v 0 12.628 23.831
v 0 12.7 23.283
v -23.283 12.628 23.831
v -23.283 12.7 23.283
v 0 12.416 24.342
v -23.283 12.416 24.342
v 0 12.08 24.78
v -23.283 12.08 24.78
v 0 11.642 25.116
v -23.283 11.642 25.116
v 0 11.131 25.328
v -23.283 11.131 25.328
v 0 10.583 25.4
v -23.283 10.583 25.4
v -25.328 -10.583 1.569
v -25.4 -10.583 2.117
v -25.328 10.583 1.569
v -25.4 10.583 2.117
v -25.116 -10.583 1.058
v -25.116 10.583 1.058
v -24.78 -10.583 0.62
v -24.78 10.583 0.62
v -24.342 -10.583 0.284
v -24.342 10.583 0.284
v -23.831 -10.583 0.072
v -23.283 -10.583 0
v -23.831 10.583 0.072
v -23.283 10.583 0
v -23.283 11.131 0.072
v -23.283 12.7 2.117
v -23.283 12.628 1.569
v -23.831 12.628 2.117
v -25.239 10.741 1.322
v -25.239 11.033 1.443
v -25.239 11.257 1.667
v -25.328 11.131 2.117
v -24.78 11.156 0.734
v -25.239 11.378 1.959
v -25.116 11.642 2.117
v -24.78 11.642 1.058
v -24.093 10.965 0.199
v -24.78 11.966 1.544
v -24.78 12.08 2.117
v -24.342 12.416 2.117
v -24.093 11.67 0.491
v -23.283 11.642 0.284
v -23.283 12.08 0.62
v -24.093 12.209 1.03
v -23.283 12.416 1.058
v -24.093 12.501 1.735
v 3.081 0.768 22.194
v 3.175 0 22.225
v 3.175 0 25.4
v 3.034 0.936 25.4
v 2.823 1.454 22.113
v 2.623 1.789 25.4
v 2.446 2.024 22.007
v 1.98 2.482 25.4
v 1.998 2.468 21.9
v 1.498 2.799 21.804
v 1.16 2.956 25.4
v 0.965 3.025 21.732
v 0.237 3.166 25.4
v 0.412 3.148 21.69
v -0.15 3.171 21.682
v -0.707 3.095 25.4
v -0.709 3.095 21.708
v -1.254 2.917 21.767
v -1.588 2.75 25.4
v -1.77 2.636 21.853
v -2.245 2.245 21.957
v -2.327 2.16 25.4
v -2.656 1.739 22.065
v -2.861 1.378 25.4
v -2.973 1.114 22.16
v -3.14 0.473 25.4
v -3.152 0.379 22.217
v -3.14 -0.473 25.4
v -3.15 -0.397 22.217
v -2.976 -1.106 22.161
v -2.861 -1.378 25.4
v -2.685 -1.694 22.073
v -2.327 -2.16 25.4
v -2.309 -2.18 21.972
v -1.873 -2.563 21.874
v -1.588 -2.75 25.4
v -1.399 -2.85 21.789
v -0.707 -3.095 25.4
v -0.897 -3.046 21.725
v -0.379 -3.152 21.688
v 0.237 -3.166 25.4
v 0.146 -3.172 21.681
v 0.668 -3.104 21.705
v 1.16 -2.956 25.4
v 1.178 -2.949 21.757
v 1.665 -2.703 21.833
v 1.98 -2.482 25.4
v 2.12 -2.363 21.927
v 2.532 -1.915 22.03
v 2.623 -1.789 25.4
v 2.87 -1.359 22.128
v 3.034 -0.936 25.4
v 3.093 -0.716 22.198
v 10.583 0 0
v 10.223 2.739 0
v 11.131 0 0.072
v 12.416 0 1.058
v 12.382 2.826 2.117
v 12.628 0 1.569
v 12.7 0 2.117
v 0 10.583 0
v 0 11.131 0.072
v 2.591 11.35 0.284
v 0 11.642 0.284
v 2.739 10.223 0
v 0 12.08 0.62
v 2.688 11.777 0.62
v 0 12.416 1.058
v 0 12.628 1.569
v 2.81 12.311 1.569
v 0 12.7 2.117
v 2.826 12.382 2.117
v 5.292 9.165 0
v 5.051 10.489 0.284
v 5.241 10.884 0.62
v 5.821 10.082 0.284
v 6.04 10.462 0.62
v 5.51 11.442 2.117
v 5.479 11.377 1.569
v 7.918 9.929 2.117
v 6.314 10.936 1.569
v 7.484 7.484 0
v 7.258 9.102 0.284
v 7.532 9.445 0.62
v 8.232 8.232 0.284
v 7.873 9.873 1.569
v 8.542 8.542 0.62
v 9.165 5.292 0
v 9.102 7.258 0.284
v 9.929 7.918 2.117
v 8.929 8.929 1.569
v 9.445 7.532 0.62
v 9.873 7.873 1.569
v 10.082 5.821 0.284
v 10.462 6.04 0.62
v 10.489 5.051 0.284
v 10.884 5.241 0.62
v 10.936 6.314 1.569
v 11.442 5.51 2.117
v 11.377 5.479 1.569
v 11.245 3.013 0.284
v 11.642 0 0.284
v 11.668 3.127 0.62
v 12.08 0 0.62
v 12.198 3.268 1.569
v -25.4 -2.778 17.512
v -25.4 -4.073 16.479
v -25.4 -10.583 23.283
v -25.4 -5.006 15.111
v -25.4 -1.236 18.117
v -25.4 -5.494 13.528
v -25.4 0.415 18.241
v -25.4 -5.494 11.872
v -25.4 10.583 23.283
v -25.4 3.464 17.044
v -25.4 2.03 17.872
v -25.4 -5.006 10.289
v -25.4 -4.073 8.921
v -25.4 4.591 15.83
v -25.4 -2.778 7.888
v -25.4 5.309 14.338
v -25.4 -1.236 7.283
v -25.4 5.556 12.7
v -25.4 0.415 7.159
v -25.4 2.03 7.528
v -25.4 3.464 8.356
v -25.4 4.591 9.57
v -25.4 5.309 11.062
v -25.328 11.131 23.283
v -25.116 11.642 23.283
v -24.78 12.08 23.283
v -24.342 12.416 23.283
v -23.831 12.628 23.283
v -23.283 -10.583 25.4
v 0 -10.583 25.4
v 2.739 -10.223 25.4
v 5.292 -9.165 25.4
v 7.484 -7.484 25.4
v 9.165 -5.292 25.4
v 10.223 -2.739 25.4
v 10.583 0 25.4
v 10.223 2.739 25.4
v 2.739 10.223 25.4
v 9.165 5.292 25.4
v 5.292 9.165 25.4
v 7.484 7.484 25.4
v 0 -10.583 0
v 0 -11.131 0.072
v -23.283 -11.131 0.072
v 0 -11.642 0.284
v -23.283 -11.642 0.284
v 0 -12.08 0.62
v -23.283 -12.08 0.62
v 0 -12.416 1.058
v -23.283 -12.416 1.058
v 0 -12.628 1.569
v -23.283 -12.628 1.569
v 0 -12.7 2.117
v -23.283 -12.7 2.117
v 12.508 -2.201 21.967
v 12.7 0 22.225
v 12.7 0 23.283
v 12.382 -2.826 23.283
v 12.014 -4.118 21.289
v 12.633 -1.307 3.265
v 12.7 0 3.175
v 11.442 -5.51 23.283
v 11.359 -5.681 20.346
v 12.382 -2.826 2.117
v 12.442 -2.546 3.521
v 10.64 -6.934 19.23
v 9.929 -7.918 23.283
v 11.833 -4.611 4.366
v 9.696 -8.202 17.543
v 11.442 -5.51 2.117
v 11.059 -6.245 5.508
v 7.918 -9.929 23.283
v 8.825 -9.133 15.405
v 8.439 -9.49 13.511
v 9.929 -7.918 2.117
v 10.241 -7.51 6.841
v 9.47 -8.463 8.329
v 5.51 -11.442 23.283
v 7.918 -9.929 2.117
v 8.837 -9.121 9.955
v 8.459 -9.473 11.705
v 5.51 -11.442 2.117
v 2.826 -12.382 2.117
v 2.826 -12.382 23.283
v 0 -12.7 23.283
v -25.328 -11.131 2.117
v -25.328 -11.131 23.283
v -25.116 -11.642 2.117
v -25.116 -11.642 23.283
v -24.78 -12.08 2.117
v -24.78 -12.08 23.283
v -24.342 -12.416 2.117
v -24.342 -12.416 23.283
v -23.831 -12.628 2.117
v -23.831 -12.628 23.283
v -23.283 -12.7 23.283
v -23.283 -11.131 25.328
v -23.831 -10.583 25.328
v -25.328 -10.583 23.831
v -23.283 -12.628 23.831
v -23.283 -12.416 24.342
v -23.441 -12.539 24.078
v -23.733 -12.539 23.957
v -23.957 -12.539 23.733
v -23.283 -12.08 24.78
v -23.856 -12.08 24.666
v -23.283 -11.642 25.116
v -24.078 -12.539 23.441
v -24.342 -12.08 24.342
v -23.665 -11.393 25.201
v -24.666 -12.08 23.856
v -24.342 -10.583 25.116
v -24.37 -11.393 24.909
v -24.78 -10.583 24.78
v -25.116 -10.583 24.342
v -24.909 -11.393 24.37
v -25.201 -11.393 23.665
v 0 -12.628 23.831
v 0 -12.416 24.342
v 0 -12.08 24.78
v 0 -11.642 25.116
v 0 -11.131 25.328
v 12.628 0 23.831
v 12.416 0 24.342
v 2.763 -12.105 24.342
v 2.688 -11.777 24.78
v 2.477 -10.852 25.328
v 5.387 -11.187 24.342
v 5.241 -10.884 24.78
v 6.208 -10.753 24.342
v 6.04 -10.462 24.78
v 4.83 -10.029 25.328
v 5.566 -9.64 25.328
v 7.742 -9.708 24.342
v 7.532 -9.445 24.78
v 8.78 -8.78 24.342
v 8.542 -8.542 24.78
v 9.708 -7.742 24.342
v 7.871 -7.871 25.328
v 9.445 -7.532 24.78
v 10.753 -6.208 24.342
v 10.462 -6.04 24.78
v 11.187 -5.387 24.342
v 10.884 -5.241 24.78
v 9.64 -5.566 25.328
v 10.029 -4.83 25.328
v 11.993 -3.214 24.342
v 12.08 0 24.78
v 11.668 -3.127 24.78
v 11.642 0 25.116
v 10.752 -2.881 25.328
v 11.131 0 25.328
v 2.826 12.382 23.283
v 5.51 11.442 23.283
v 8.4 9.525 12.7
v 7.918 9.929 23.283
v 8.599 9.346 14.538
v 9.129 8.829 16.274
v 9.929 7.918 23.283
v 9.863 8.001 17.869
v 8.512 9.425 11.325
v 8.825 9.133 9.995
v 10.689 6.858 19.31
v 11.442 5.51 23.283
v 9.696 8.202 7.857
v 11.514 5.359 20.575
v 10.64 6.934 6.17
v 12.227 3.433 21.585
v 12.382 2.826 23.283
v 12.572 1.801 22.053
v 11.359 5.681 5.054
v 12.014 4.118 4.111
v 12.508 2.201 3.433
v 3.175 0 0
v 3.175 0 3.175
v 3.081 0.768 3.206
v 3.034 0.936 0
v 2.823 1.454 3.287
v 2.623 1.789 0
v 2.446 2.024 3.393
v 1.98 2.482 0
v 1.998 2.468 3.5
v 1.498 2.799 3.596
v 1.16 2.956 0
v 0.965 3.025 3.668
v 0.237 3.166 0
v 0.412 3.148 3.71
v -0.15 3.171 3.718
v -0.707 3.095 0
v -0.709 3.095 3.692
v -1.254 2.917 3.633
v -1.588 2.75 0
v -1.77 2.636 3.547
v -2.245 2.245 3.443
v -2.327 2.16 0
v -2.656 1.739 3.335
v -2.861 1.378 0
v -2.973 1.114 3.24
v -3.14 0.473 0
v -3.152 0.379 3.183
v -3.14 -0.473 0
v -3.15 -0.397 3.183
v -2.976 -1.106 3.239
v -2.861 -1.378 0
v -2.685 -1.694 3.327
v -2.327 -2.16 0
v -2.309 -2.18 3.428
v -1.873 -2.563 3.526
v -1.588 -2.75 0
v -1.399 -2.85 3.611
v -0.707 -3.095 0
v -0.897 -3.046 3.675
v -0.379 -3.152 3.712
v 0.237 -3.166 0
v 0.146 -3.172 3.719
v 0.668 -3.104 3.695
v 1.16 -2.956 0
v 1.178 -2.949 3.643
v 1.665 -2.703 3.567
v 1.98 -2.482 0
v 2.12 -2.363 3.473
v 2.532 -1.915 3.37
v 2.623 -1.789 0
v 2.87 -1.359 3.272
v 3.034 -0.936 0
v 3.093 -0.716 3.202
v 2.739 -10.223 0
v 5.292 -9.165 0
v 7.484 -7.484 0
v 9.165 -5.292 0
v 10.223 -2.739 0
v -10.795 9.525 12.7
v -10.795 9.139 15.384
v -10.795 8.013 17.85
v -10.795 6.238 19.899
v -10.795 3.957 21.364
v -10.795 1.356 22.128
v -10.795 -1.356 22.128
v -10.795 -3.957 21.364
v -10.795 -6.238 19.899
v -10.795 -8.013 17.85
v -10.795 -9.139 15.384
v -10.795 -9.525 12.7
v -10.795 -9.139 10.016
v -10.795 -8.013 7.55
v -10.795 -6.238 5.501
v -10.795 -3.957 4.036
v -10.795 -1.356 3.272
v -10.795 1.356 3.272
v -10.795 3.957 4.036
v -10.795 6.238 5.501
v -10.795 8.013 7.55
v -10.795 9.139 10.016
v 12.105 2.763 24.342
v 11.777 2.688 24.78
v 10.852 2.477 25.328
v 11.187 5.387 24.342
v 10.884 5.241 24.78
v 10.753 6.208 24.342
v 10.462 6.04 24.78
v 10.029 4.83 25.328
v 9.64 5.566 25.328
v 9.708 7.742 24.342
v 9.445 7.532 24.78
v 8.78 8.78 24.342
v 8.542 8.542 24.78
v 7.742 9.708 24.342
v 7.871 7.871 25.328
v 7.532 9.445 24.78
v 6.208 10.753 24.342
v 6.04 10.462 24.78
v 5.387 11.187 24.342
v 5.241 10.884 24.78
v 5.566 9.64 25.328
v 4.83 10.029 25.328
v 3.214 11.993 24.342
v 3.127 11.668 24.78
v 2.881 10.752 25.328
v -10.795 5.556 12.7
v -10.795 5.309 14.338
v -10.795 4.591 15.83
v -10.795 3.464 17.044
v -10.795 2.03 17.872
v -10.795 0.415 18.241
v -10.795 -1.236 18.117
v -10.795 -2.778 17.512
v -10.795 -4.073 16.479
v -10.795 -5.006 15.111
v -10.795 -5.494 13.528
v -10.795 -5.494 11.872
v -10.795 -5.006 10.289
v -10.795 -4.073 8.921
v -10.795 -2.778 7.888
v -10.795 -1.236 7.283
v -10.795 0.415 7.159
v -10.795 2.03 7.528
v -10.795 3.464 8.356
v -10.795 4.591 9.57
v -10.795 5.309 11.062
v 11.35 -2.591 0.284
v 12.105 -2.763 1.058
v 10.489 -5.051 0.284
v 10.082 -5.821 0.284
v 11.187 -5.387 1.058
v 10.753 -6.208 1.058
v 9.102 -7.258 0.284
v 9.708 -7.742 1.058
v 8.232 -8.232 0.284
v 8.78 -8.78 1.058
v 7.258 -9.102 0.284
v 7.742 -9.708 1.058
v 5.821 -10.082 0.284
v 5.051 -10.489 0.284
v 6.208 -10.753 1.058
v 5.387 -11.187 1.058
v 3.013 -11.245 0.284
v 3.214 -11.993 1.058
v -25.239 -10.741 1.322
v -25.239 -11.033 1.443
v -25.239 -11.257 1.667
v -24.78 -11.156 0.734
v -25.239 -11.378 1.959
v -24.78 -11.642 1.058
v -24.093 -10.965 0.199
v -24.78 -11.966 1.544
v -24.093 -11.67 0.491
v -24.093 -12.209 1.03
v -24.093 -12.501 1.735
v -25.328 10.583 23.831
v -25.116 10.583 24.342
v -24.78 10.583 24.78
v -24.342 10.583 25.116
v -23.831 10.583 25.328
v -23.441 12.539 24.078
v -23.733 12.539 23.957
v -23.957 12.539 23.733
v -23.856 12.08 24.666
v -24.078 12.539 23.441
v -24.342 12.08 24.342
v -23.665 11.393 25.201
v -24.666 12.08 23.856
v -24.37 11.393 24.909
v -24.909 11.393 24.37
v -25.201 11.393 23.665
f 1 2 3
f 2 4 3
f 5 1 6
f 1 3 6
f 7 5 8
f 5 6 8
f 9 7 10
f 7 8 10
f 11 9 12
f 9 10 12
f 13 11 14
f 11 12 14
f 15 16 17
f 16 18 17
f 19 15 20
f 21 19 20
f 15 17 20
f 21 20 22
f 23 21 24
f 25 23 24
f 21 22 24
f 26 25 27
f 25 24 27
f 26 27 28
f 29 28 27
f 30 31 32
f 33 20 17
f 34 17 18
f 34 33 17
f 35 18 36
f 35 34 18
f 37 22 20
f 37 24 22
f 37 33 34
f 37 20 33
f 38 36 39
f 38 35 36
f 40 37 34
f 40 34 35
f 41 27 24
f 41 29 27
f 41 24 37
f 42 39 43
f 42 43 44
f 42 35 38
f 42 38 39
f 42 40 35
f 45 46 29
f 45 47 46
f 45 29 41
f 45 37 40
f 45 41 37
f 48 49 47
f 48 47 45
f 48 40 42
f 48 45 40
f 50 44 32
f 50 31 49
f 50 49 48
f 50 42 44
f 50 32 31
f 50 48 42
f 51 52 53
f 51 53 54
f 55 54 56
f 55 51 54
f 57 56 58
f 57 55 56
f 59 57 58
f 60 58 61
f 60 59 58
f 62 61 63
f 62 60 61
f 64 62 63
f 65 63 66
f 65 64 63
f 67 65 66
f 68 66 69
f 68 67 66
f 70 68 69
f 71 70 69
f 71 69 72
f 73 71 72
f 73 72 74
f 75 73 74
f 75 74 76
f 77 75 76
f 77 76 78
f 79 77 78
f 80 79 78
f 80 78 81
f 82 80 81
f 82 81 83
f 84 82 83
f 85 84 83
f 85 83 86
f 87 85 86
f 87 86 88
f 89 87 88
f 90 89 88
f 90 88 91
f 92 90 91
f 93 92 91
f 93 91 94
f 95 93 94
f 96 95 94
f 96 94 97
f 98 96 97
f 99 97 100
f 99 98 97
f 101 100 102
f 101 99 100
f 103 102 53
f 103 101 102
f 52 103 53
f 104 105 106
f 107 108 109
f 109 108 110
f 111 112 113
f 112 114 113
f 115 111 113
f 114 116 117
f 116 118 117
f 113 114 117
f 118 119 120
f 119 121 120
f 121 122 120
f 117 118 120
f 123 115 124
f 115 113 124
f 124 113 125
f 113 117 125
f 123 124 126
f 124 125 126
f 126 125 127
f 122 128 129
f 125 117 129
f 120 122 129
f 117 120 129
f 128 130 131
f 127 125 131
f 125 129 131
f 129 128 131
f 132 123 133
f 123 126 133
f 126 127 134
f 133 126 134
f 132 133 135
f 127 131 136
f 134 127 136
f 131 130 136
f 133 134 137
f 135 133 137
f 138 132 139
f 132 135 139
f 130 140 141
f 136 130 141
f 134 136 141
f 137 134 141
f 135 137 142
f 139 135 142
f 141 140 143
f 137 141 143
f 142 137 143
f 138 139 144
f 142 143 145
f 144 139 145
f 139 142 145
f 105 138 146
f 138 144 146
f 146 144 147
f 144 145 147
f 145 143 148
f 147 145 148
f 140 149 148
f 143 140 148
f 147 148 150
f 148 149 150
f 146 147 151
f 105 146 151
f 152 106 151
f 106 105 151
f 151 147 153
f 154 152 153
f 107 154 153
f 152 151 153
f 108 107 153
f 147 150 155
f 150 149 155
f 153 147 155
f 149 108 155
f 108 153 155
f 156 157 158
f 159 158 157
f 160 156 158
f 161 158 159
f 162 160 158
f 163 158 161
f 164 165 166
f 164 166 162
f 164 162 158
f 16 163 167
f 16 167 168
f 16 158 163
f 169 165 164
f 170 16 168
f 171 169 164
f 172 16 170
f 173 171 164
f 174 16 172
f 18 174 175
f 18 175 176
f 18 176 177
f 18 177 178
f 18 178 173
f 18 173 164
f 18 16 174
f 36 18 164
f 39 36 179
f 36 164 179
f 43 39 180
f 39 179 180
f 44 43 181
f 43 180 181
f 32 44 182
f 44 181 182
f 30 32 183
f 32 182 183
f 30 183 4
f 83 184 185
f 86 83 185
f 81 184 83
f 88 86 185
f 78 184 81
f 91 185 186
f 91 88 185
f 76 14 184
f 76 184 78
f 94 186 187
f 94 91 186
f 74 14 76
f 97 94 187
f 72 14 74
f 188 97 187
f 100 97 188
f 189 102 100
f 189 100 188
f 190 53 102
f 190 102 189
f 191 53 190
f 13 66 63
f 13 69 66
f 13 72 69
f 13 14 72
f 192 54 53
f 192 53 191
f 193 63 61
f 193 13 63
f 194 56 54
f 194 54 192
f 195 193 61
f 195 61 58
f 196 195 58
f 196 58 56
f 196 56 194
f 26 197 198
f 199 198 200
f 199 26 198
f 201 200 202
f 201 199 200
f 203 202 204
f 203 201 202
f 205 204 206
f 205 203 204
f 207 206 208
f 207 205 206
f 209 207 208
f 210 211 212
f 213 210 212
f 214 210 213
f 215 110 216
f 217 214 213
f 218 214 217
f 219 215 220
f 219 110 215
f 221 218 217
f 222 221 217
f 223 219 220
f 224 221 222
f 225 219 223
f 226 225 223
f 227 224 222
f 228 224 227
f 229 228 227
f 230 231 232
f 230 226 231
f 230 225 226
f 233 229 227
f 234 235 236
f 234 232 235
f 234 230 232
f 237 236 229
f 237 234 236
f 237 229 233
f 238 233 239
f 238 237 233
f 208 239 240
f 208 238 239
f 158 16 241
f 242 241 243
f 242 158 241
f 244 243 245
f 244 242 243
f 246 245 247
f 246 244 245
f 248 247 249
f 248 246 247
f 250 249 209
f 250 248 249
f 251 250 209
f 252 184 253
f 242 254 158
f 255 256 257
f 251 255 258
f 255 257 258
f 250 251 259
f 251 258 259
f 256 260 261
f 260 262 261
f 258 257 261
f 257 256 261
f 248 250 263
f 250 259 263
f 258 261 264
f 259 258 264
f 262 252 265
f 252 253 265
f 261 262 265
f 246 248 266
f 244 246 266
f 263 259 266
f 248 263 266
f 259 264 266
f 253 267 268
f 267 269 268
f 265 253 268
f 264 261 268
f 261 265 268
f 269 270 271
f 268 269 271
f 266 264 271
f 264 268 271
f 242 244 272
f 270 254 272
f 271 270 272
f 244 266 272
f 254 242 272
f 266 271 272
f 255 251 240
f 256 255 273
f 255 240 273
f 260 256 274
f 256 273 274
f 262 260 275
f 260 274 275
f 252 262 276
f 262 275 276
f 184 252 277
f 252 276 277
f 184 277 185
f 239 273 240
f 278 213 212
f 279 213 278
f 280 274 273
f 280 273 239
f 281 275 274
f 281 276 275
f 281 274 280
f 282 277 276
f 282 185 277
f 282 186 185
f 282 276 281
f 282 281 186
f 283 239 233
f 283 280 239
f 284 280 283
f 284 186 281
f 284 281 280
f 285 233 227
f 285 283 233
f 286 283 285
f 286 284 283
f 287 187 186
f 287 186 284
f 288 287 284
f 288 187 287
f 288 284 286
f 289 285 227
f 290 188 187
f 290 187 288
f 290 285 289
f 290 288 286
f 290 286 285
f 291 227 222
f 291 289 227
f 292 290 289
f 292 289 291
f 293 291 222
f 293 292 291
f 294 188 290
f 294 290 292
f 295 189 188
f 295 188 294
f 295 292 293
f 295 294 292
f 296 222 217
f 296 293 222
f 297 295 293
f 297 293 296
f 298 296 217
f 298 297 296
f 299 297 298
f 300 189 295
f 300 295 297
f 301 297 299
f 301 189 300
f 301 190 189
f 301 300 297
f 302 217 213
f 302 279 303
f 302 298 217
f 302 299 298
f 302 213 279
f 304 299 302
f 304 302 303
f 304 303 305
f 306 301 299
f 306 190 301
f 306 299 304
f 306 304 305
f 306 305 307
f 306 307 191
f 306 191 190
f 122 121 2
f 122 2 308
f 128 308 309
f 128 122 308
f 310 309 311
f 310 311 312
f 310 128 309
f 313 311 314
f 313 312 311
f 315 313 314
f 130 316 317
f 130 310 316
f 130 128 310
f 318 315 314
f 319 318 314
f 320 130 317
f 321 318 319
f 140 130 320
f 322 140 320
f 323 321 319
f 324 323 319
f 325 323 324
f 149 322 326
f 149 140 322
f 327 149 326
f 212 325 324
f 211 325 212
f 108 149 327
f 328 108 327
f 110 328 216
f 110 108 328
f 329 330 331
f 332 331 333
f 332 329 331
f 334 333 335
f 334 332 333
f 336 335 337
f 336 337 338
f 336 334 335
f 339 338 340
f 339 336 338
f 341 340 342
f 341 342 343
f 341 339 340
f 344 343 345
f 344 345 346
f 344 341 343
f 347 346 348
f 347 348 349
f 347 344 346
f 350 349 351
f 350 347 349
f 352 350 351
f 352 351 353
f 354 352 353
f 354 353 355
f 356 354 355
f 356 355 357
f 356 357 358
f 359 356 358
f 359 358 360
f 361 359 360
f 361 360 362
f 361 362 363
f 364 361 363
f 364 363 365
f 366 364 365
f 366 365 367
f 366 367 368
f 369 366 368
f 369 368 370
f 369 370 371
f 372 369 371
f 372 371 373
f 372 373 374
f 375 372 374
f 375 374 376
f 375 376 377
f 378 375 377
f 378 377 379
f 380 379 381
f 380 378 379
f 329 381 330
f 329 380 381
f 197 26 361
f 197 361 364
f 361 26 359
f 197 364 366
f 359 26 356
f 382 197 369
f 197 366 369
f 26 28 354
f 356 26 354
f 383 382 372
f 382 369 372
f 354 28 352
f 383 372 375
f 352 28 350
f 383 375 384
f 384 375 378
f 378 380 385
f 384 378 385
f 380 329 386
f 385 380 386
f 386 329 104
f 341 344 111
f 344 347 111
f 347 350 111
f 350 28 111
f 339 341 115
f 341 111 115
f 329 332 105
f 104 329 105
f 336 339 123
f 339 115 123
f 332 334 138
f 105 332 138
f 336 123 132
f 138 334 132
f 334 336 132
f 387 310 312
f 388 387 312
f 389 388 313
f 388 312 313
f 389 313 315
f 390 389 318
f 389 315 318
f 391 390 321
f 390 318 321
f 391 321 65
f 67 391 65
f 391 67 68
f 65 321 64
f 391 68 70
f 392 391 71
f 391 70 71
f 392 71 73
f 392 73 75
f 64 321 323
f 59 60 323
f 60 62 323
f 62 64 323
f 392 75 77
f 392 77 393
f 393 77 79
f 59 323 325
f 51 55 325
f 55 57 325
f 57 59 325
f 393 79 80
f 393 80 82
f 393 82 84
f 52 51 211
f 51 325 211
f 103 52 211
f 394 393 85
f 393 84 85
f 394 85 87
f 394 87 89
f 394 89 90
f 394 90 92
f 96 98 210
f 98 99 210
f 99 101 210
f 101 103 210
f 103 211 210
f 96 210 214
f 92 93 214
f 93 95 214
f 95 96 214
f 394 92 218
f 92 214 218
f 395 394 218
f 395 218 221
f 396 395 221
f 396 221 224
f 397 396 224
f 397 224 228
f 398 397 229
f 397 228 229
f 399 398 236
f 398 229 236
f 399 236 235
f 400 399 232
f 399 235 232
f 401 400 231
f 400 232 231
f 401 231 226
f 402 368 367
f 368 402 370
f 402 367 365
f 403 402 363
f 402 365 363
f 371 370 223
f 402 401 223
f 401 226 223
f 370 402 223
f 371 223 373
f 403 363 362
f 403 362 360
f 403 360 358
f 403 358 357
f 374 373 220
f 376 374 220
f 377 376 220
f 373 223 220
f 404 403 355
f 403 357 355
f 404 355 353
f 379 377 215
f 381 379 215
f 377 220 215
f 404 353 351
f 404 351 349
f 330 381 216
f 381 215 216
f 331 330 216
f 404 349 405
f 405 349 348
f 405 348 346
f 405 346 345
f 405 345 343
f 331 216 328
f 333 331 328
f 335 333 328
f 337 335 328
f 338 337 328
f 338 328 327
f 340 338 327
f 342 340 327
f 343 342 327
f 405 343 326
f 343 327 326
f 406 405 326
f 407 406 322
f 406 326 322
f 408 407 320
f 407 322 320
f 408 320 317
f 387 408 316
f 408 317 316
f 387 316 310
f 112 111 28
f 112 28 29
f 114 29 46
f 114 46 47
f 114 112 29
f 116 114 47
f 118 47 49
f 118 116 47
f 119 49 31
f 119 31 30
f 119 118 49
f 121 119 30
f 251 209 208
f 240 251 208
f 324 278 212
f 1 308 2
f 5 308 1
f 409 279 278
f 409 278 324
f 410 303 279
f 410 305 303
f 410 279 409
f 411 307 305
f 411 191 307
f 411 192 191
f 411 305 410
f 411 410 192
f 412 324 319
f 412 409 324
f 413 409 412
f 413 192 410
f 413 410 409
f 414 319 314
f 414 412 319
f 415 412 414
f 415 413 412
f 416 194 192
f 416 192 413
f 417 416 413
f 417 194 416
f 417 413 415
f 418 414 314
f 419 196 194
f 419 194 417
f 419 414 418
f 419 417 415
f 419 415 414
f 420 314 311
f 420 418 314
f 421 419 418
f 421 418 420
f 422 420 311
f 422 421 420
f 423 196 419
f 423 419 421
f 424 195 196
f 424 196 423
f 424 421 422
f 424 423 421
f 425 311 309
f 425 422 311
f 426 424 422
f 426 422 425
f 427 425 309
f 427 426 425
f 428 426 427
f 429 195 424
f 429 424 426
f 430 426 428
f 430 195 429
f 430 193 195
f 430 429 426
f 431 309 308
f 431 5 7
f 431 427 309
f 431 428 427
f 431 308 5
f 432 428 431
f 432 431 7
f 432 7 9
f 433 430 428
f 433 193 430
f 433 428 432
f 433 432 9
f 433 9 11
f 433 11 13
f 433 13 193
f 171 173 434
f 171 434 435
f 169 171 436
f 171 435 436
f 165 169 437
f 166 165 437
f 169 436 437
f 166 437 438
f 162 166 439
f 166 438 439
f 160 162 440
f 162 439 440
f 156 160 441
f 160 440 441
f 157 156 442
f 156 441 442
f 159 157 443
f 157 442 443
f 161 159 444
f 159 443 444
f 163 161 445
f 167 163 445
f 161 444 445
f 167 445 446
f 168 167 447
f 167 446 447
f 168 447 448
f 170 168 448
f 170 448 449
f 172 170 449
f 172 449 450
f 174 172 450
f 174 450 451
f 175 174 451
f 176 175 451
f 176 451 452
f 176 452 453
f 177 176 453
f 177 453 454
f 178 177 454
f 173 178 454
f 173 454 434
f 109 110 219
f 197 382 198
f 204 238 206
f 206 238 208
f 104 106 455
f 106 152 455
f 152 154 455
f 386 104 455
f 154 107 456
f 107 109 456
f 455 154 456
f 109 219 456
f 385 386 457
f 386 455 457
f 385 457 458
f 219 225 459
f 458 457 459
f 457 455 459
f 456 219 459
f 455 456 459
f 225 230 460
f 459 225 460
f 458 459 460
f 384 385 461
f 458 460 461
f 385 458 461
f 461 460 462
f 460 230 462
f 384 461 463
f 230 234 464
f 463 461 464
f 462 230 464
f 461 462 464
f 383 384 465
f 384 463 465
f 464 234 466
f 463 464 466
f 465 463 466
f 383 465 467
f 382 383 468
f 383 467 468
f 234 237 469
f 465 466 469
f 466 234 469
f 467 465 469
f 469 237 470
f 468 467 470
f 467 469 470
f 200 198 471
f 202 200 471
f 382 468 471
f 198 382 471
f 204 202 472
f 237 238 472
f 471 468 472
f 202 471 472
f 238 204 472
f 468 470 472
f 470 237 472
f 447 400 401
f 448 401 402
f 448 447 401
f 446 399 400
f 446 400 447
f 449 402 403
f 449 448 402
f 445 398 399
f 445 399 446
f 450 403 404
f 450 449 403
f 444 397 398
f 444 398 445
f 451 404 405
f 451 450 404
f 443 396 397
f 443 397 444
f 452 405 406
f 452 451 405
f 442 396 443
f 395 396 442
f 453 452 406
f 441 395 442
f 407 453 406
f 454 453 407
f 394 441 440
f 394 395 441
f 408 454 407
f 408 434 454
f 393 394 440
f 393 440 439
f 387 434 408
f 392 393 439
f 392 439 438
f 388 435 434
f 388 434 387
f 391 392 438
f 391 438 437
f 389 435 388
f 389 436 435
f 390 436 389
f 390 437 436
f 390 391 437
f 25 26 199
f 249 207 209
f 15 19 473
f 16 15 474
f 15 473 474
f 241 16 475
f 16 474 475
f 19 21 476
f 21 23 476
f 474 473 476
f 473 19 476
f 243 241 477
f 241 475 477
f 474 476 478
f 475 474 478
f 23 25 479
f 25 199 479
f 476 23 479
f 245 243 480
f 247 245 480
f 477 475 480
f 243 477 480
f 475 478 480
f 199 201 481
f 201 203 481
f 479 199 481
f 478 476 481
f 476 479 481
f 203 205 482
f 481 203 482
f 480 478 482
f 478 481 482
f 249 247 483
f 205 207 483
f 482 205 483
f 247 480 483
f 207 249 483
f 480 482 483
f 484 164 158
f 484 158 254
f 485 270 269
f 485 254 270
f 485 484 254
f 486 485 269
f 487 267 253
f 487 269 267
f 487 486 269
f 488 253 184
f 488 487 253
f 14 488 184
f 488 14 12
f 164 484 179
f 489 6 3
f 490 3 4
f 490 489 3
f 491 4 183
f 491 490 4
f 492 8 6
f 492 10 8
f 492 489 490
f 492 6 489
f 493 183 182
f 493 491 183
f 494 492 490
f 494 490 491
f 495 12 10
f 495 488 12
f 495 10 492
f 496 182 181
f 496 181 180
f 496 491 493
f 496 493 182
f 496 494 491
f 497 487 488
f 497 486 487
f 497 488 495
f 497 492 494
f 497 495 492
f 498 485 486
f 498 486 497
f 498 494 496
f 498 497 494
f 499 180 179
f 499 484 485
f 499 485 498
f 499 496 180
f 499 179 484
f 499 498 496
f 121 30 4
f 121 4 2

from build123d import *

# Parameters (mm, degrees)
SKETCH1_W           = 38.1
SKETCH1_H           = 25.4
SKETCH1_R           = 3.175
BOSS_EXTRUDE1_DEPTH = 25.4
SKETCH2_R           = 9.525
SKETCH2_R_2         = 5.55625
CUT_EXTRUDE1_DEPTH  = 23.495
SKETCH2_4_R         = 5.55625
CUT_EXTRUDE2_DEPTH  = 48.519048865
FILLET1_DEPTH       = 25.4
FILLET2_R           = 2.116666667


with BuildPart() as part:
    # Sketch1 → Boss-Extrude1 (new body)
    with BuildSketch(Plane.XY):
        with Locations((-6.35, 0)):
            Rectangle(SKETCH1_W, SKETCH1_H)
        Circle(SKETCH1_R, mode=Mode.SUBTRACT)
    extrude(amount=BOSS_EXTRUDE1_DEPTH)

    # Sketch2 → Cut-Extrude1 (cut)
    # profile 1 of 2: a face of its own
    with BuildSketch(Plane(origin=(12.7, 0, 0), x_dir=(0, 0, -1), z_dir=(1, 0, 0))):
        with Locations(Location((-12.7, 0, 0), (0, 0, 90))):
            Circle(SKETCH2_R)
        with Locations((-12.7, 0)):
            Circle(SKETCH2_R_2, mode=Mode.SUBTRACT)
    # profile 2 of 2: a face of its own
    with BuildSketch(Plane(origin=(12.7, 0, 0), x_dir=(0, 0, -1), z_dir=(1, 0, 0))):
        with Locations((-12.7, 0)):
            Circle(SKETCH2_R_2)
    extrude(amount=-CUT_EXTRUDE1_DEPTH, mode=Mode.SUBTRACT)

    # Sketch2<4> → Cut-Extrude2 (cut, through all)
    with BuildSketch(Plane(origin=(12.7, 0, 0), x_dir=(0, 0, -1), z_dir=(1, 0, 0))):
        with Locations(Location((-12.7, 0, 0), (0, 0, 90))):
            Circle(SKETCH2_4_R)
    extrude(amount=-CUT_EXTRUDE2_DEPTH, mode=Mode.SUBTRACT)

    # Fillet1: read off the stored shape, not the designer's step
    # Fillet1 outline → Fillet1 (cut)
    with BuildSketch(Plane.XY):
        with BuildLine():
            Line((12.7, 12.7), (0, 12.7))
            ThreePointArc((0, 12.7), (8.980256121, 8.980256121), (12.7, 0))
            Line((12.7, 0), (12.7, 12.7))
        make_face()
        with BuildLine():
            Line((12.7, -12.7), (12.7, 0))
            ThreePointArc((12.7, 0), (8.980256121, -8.980256121), (0, -12.7))
            Line((0, -12.7), (12.7, -12.7))
        make_face()
    extrude(amount=FILLET1_DEPTH, mode=Mode.SUBTRACT)

    # Fillet2
    fillet2_edges = [part.edges().sort_by_distance(p)[0] for p in [
        (-25.4, 0, 25.4),
        (-12.7, -12.7, 25.4),
        (-12.7, 12.7, 0),
        (8.980256121, 8.980256121, 0),
        (8.980256121, -8.980256121, 0),
        (-12.7, 12.7, 25.4),
        (8.980256121, 8.980256121, 25.4),
        (8.980256121, -8.980256121, 25.4),
        (-12.7, -12.7, 0),
        (-25.4, 0, 0),
        (-25.4, -12.7, 12.7),
        (-25.4, 12.7, 12.7),
    ]]
    fillet(fillet2_edges, radius=FILLET2_R)


solid = part.part
